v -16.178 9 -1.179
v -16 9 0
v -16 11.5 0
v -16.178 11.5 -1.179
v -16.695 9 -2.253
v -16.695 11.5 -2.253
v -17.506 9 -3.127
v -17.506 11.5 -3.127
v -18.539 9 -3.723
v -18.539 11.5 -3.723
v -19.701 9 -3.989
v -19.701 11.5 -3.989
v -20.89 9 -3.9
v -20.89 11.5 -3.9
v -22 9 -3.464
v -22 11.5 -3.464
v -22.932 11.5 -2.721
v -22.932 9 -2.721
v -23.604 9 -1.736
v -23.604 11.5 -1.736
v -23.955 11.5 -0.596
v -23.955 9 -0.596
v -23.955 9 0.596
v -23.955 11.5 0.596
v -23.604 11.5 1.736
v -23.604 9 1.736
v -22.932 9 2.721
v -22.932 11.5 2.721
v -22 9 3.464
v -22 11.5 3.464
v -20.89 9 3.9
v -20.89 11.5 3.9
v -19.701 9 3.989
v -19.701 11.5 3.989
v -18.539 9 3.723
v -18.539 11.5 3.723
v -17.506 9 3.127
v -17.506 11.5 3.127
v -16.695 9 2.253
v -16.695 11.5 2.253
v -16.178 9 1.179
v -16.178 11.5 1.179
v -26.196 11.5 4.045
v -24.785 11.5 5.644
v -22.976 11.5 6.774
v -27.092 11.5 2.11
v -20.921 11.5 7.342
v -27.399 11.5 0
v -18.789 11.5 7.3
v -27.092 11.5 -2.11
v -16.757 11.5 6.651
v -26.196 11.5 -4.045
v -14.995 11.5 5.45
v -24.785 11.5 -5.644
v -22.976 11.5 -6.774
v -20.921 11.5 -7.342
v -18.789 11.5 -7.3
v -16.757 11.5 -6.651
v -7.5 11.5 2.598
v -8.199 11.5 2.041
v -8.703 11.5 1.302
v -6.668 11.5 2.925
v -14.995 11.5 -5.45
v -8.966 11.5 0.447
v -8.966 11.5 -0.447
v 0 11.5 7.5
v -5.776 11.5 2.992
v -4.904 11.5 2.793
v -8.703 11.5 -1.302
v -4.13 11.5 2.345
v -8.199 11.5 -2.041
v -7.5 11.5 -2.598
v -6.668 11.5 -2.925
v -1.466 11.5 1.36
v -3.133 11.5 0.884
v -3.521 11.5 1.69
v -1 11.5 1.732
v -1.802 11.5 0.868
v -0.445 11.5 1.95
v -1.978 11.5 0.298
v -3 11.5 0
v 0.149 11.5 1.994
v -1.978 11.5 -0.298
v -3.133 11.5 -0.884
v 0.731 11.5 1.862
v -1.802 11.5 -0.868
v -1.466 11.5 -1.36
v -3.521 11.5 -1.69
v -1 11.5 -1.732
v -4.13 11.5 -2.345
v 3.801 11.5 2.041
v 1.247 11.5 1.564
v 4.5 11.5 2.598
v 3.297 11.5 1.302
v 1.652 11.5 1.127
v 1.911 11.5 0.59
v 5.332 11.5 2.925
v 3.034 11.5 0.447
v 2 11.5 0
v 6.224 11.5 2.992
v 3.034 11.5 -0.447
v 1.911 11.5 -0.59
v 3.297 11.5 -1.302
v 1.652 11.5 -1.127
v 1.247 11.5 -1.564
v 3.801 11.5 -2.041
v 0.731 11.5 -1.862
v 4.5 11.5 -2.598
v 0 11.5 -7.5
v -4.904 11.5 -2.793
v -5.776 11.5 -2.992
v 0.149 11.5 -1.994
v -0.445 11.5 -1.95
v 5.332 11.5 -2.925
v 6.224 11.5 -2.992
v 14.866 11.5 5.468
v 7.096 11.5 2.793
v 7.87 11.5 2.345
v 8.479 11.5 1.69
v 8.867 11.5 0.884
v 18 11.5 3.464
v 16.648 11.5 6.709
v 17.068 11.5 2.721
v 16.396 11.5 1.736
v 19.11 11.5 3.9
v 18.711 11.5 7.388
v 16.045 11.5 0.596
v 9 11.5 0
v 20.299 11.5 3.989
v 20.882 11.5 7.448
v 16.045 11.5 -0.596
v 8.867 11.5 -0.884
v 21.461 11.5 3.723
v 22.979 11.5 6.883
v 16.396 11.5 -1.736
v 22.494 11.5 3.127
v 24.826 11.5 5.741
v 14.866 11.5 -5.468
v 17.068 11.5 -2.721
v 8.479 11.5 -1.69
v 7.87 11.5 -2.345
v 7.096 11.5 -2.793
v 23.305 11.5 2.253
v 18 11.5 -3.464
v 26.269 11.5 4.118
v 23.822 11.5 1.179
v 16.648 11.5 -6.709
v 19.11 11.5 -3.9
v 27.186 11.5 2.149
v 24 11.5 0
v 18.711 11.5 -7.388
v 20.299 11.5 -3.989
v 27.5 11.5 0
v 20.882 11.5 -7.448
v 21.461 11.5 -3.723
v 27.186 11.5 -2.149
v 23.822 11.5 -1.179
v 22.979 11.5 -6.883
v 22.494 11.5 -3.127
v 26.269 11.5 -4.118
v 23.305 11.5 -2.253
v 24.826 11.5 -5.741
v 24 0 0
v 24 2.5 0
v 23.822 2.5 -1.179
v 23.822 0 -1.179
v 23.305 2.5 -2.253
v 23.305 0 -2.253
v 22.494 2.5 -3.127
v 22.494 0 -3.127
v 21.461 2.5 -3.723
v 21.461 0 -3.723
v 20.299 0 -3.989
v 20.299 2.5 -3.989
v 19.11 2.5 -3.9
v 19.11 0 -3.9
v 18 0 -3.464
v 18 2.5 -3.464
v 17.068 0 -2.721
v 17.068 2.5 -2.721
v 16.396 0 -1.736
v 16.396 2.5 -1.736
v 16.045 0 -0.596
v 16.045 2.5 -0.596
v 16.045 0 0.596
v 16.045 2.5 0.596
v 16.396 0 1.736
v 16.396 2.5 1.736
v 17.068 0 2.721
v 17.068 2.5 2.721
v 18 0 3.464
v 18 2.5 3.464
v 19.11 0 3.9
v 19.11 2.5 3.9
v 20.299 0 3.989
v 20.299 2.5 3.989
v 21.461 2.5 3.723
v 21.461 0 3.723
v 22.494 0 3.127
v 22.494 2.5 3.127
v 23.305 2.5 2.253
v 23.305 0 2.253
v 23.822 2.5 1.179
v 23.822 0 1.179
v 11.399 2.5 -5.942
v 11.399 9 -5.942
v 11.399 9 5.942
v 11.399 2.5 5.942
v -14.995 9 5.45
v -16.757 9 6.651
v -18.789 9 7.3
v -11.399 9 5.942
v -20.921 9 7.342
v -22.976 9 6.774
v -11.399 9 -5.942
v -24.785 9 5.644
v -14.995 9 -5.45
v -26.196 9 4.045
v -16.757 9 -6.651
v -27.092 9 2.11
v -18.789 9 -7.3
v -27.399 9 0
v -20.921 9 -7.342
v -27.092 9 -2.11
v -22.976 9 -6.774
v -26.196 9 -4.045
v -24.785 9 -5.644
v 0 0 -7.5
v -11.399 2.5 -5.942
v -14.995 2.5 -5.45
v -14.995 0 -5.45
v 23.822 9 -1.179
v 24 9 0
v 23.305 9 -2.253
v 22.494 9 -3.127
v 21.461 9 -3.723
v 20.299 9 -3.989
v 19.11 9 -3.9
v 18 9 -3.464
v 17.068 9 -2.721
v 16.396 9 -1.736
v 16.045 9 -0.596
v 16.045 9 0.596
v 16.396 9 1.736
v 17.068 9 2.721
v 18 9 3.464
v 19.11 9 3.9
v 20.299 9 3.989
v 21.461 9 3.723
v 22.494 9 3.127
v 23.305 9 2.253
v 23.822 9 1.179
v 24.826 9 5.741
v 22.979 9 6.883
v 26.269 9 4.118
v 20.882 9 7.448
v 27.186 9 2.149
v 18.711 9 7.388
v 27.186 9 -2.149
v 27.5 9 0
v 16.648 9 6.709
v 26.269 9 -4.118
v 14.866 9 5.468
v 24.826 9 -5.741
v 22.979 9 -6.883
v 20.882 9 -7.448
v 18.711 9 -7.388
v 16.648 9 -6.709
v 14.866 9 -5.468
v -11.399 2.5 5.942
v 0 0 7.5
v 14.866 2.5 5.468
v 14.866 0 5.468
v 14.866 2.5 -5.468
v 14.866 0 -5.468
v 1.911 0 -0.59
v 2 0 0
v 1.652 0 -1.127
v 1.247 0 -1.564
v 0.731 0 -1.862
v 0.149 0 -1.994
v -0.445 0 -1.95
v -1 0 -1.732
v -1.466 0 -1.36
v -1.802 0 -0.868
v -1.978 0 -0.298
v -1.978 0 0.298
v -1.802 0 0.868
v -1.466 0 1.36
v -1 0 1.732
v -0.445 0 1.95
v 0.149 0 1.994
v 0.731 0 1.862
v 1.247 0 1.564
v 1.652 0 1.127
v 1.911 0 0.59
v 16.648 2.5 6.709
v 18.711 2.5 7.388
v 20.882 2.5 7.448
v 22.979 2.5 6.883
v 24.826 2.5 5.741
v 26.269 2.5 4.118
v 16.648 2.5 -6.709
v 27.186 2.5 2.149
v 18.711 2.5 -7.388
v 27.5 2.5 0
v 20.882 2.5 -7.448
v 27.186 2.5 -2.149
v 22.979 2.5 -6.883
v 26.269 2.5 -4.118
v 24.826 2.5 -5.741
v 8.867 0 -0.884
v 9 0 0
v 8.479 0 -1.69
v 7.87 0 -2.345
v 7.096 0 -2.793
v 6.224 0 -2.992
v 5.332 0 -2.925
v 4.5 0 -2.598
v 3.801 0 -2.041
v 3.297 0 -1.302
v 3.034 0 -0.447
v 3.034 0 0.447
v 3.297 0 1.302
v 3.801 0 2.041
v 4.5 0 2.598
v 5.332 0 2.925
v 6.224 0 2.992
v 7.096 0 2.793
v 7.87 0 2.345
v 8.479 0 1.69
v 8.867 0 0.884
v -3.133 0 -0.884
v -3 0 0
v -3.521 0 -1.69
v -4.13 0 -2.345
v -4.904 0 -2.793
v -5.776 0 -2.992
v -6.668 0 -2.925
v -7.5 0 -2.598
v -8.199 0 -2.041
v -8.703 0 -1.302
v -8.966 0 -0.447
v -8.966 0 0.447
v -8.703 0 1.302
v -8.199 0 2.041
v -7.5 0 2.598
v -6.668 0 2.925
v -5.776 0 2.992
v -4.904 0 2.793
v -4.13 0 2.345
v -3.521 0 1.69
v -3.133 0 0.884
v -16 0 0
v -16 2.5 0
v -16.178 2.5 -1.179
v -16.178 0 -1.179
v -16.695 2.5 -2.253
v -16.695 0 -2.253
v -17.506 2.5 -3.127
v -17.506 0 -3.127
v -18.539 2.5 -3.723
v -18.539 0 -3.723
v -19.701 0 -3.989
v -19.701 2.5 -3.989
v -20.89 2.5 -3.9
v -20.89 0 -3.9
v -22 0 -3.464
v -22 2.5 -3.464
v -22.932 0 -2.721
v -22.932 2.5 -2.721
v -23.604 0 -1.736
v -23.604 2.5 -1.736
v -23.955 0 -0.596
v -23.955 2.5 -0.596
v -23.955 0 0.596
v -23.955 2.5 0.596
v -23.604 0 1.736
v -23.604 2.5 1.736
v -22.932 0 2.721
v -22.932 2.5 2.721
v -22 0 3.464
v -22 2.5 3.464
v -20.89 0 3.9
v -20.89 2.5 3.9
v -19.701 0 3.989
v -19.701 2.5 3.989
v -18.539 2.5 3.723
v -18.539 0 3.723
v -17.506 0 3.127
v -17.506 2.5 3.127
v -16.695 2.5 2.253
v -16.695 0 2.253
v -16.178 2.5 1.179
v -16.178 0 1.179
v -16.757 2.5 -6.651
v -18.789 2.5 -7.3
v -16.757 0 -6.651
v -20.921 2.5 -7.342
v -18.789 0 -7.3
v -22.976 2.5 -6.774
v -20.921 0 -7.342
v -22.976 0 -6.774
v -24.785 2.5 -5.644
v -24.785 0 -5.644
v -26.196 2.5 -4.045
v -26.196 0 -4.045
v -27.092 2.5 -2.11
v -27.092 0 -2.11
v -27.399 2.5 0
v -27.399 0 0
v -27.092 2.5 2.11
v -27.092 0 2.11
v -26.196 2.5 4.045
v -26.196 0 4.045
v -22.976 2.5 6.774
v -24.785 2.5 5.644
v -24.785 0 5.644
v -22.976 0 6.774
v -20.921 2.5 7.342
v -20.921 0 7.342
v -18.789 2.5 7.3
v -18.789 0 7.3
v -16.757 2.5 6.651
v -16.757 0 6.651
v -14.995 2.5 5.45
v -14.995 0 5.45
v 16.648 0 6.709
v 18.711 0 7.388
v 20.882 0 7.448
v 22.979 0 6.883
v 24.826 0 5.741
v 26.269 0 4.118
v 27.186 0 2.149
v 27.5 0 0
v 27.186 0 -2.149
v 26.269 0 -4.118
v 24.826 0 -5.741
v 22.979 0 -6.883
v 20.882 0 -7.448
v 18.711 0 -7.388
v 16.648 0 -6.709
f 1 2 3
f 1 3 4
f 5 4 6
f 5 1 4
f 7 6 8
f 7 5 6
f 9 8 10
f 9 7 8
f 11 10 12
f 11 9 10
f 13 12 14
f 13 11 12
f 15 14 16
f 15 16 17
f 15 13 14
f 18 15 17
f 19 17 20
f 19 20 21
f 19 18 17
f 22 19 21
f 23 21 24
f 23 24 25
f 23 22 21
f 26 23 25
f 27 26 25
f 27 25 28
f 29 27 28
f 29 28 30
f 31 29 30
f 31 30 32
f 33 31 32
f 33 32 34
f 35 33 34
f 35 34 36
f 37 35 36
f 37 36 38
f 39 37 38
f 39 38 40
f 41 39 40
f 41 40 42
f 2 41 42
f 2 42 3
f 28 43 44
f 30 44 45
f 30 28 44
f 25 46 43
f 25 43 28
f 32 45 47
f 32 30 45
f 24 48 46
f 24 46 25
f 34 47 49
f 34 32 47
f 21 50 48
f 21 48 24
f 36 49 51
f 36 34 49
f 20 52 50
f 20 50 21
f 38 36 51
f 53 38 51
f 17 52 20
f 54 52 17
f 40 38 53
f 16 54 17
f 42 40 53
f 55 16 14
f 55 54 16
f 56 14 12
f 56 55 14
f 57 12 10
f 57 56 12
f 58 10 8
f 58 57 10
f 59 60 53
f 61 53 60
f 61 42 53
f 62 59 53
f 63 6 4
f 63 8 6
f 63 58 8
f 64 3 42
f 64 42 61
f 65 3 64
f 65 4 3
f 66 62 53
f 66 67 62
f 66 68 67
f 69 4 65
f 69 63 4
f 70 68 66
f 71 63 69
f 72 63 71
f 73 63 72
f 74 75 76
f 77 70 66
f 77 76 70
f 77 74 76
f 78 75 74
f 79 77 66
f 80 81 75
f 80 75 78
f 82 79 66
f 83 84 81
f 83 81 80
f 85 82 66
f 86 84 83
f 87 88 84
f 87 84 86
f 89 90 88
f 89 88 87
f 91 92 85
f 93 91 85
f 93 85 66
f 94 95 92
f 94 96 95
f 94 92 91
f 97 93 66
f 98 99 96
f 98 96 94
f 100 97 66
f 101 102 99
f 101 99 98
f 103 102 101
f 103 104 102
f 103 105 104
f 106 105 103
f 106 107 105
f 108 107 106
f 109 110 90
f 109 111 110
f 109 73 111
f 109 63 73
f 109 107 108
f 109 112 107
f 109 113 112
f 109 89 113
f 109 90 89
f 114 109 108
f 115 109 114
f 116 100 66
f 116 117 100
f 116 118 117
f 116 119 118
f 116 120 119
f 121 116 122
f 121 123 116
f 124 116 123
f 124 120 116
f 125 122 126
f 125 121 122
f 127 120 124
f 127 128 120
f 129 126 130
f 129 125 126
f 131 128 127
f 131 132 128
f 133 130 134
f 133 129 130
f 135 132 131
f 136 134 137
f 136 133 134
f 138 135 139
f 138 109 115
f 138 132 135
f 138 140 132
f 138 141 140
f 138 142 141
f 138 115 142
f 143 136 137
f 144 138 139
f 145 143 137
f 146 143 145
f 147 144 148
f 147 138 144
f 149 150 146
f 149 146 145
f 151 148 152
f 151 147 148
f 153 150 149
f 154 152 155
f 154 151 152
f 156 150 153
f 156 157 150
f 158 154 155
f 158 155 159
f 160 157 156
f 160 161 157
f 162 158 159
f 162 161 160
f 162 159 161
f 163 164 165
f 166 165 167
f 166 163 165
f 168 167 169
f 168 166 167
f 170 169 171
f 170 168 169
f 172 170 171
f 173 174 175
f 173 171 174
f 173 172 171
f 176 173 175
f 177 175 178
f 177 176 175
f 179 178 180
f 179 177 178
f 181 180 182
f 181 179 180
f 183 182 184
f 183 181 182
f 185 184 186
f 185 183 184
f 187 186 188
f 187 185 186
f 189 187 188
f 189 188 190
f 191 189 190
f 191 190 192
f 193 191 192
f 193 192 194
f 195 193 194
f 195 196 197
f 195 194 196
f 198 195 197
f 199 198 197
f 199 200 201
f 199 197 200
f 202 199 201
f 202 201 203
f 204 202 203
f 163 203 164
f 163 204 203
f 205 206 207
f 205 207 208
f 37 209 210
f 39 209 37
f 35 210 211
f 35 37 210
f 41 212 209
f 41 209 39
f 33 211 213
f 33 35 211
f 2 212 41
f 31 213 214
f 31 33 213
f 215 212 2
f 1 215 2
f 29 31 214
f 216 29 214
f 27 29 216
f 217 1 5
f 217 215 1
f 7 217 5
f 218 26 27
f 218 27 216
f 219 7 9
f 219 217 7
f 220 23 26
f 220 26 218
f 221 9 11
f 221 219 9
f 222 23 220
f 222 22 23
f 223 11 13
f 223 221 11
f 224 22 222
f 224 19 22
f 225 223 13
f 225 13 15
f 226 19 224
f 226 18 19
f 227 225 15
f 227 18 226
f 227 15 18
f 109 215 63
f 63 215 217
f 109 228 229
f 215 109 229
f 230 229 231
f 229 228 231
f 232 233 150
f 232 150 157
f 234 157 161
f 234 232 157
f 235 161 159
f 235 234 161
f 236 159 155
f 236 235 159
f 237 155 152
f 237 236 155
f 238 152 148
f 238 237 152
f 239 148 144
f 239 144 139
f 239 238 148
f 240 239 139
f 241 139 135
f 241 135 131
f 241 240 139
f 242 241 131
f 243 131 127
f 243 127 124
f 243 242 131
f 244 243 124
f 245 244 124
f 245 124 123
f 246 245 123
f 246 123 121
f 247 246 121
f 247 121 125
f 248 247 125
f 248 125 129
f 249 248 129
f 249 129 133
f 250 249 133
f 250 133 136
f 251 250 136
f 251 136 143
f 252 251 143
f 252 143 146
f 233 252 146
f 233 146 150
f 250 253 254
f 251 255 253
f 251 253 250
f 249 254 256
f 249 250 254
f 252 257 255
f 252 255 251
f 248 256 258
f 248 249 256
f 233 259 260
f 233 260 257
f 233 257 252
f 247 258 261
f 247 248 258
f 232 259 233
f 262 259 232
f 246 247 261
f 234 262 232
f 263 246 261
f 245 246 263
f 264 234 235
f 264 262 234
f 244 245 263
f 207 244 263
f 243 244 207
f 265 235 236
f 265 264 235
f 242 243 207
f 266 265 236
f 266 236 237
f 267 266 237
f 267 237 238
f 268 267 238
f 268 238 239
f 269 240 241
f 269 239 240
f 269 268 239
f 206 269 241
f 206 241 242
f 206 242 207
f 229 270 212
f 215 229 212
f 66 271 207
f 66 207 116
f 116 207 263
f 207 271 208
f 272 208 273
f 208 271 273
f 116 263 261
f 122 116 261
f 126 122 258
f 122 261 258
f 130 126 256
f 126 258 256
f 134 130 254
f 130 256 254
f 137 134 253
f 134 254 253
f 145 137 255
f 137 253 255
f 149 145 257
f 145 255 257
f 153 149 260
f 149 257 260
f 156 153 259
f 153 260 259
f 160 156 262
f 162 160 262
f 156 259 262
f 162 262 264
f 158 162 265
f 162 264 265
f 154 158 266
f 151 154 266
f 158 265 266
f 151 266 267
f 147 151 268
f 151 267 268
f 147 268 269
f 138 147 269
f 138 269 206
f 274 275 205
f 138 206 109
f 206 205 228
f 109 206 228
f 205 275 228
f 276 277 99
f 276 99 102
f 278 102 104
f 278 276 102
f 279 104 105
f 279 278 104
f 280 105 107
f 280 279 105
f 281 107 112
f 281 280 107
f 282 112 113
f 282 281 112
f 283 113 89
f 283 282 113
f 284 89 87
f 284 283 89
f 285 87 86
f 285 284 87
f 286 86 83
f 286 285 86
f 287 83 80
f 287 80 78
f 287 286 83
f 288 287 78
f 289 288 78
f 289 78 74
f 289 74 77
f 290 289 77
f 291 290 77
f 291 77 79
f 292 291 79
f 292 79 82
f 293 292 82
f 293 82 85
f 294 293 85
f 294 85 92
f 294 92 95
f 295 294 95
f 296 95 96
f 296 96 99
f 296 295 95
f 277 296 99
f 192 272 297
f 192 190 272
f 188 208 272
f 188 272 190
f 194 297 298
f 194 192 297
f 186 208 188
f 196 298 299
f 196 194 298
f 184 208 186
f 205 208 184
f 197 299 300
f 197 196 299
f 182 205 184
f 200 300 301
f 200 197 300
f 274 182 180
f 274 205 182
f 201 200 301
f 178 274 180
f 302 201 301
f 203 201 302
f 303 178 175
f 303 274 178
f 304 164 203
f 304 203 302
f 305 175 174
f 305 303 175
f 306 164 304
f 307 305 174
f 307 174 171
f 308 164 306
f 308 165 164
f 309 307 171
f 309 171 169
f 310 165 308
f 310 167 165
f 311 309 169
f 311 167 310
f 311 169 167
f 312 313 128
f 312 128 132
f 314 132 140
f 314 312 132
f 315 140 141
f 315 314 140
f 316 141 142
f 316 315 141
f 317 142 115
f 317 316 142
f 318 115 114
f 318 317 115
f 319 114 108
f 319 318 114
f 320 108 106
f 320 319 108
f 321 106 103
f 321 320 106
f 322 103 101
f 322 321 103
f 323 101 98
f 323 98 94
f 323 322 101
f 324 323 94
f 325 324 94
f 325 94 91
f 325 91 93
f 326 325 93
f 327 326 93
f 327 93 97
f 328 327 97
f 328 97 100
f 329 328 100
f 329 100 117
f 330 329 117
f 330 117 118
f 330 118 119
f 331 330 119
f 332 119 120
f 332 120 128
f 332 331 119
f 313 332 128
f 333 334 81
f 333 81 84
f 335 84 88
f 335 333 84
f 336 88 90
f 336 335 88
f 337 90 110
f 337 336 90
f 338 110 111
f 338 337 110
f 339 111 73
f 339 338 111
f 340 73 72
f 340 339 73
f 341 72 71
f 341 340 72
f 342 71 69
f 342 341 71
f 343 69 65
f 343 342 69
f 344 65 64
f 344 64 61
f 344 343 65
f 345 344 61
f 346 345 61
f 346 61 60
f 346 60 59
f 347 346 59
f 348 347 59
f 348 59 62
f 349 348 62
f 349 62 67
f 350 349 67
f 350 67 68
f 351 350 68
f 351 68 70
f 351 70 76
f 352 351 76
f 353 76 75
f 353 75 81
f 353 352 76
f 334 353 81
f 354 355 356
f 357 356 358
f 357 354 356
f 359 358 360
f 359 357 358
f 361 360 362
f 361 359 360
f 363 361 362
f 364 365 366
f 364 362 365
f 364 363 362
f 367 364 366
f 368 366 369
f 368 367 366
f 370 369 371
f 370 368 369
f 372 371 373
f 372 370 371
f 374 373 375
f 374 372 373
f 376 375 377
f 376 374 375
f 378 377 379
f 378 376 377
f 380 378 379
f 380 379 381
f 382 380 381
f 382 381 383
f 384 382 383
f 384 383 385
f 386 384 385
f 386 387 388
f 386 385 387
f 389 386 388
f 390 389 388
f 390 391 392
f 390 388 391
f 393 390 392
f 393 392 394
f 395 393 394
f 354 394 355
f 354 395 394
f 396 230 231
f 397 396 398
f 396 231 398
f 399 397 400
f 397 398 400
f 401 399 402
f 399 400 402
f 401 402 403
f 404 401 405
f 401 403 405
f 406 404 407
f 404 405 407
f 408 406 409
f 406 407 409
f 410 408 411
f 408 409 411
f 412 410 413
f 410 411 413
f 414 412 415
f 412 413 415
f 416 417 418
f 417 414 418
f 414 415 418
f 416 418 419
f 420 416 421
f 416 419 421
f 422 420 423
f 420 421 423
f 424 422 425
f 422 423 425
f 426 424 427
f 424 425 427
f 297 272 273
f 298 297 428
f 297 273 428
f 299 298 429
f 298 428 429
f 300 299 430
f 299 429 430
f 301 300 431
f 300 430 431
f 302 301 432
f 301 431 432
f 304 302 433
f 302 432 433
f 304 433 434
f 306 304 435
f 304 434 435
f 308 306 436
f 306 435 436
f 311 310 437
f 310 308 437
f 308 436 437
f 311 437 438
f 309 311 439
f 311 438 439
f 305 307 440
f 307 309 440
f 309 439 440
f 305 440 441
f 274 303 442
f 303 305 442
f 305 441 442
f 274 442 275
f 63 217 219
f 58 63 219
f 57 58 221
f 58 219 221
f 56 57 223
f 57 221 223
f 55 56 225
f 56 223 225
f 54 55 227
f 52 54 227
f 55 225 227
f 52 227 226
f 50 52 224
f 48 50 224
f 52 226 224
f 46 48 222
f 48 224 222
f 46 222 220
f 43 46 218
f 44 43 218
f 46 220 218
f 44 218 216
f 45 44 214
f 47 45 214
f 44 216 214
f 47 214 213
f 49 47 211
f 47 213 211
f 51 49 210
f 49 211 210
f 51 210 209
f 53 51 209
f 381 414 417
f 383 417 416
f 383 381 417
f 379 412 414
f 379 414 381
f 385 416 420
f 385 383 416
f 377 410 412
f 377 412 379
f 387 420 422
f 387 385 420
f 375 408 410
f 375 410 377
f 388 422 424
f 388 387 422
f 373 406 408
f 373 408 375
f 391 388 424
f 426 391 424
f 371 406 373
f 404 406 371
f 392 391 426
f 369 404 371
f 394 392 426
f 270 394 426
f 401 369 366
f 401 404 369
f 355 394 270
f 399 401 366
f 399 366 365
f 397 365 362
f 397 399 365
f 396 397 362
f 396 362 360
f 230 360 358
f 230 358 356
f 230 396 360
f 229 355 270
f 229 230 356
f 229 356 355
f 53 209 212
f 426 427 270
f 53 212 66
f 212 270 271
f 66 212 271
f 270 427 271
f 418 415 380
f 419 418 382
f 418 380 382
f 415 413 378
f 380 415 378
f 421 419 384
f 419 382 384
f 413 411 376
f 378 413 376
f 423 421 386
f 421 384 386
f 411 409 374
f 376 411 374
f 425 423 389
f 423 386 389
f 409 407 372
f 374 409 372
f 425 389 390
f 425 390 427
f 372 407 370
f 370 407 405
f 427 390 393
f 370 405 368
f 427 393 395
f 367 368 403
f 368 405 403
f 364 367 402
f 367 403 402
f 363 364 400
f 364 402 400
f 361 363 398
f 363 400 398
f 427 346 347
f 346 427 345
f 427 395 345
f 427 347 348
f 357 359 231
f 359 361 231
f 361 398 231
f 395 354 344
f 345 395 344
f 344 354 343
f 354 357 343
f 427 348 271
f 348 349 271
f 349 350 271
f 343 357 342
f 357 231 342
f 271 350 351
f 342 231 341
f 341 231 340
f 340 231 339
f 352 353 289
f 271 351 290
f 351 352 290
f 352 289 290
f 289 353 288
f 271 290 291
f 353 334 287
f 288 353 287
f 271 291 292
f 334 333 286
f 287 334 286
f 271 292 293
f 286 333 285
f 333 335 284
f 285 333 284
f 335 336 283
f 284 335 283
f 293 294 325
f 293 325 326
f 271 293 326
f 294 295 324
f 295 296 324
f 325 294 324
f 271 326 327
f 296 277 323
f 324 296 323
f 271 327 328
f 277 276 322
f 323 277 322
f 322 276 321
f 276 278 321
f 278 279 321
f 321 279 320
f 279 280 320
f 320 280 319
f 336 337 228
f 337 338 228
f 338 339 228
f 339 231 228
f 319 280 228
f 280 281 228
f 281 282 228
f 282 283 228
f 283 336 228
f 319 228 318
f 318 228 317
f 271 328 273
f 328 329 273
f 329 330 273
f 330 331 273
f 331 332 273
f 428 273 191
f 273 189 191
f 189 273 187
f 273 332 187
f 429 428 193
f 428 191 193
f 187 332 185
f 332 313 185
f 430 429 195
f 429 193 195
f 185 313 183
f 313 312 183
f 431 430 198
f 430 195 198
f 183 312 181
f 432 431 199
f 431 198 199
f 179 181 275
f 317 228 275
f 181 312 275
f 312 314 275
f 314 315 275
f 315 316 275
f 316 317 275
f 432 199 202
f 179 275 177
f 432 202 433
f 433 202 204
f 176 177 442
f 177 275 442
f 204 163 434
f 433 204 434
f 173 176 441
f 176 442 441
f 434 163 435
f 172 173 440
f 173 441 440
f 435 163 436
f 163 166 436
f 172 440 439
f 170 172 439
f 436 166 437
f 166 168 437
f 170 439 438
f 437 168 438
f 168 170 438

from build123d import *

# Parameters (mm, degrees)
IZIM2_R                     = 4
IZIM2_R_2                   = 3
IZIM2_R_3                   = 2
Y_KSEKLIK_EKSTR_ZYON1_DEPTH = 11.5
KES_EKSTR_ZYON9_DEPTH       = 50
KES_EKSTR_ZYON9_DEPTH_BACK  = 50
IZIM16_W                    = 17.702500787
IZIM16_H                    = 6.5


with BuildPart() as part:
    # Çizim2 → Yükseklik-Ekstrüzyon1 (new body)
    with BuildSketch(Plane(origin=(0, 0, 0), x_dir=(1, 0, 0), z_dir=(0, 1, 0))):
        with BuildLine():
            Line((0, 7.5), (-14.995122872, 5.45))
            ThreePointArc((-14.995122872, 5.45), (-27.399411806, 0), (-14.995122872, -5.45))
            Line((-14.995122872, -5.45), (0, -7.5))
            Line((0, -7.5), (14.866270364, -5.46761557))
            ThreePointArc((14.866270364, -5.46761557), (27.5, 0), (14.866270364, 5.46761557))
            Line((14.866270364, 5.46761557), (0, 7.5))
        make_face()
        with Locations((-20, 0)):
            Circle(IZIM2_R, mode=Mode.SUBTRACT)
        with Locations((-6, 0)):
            Circle(IZIM2_R_2, mode=Mode.SUBTRACT)
        Circle(IZIM2_R_3, mode=Mode.SUBTRACT)
        with Locations((6, 0)):
            Circle(IZIM2_R_2, mode=Mode.SUBTRACT)
        with Locations((20, 0)):
            Circle(IZIM2_R, mode=Mode.SUBTRACT)
    extrude(amount=Y_KSEKLIK_EKSTR_ZYON1_DEPTH)

    # Çizim16 → Kes-Ekstrüzyon9 (cut, two sides: drawn at the far end of the back side and taken through both)
    with BuildSketch(Plane.XY.offset(-KES_EKSTR_ZYON9_DEPTH_BACK)):
        with Locations((-20.2506622, 5.75)):
            Rectangle(IZIM16_W, IZIM16_H)
        with Locations((20.2506622, 5.75)):
            Rectangle(IZIM16_W, IZIM16_H)
    extrude(amount=KES_EKSTR_ZYON9_DEPTH + KES_EKSTR_ZYON9_DEPTH_BACK, mode=Mode.SUBTRACT)


solid = part.part
